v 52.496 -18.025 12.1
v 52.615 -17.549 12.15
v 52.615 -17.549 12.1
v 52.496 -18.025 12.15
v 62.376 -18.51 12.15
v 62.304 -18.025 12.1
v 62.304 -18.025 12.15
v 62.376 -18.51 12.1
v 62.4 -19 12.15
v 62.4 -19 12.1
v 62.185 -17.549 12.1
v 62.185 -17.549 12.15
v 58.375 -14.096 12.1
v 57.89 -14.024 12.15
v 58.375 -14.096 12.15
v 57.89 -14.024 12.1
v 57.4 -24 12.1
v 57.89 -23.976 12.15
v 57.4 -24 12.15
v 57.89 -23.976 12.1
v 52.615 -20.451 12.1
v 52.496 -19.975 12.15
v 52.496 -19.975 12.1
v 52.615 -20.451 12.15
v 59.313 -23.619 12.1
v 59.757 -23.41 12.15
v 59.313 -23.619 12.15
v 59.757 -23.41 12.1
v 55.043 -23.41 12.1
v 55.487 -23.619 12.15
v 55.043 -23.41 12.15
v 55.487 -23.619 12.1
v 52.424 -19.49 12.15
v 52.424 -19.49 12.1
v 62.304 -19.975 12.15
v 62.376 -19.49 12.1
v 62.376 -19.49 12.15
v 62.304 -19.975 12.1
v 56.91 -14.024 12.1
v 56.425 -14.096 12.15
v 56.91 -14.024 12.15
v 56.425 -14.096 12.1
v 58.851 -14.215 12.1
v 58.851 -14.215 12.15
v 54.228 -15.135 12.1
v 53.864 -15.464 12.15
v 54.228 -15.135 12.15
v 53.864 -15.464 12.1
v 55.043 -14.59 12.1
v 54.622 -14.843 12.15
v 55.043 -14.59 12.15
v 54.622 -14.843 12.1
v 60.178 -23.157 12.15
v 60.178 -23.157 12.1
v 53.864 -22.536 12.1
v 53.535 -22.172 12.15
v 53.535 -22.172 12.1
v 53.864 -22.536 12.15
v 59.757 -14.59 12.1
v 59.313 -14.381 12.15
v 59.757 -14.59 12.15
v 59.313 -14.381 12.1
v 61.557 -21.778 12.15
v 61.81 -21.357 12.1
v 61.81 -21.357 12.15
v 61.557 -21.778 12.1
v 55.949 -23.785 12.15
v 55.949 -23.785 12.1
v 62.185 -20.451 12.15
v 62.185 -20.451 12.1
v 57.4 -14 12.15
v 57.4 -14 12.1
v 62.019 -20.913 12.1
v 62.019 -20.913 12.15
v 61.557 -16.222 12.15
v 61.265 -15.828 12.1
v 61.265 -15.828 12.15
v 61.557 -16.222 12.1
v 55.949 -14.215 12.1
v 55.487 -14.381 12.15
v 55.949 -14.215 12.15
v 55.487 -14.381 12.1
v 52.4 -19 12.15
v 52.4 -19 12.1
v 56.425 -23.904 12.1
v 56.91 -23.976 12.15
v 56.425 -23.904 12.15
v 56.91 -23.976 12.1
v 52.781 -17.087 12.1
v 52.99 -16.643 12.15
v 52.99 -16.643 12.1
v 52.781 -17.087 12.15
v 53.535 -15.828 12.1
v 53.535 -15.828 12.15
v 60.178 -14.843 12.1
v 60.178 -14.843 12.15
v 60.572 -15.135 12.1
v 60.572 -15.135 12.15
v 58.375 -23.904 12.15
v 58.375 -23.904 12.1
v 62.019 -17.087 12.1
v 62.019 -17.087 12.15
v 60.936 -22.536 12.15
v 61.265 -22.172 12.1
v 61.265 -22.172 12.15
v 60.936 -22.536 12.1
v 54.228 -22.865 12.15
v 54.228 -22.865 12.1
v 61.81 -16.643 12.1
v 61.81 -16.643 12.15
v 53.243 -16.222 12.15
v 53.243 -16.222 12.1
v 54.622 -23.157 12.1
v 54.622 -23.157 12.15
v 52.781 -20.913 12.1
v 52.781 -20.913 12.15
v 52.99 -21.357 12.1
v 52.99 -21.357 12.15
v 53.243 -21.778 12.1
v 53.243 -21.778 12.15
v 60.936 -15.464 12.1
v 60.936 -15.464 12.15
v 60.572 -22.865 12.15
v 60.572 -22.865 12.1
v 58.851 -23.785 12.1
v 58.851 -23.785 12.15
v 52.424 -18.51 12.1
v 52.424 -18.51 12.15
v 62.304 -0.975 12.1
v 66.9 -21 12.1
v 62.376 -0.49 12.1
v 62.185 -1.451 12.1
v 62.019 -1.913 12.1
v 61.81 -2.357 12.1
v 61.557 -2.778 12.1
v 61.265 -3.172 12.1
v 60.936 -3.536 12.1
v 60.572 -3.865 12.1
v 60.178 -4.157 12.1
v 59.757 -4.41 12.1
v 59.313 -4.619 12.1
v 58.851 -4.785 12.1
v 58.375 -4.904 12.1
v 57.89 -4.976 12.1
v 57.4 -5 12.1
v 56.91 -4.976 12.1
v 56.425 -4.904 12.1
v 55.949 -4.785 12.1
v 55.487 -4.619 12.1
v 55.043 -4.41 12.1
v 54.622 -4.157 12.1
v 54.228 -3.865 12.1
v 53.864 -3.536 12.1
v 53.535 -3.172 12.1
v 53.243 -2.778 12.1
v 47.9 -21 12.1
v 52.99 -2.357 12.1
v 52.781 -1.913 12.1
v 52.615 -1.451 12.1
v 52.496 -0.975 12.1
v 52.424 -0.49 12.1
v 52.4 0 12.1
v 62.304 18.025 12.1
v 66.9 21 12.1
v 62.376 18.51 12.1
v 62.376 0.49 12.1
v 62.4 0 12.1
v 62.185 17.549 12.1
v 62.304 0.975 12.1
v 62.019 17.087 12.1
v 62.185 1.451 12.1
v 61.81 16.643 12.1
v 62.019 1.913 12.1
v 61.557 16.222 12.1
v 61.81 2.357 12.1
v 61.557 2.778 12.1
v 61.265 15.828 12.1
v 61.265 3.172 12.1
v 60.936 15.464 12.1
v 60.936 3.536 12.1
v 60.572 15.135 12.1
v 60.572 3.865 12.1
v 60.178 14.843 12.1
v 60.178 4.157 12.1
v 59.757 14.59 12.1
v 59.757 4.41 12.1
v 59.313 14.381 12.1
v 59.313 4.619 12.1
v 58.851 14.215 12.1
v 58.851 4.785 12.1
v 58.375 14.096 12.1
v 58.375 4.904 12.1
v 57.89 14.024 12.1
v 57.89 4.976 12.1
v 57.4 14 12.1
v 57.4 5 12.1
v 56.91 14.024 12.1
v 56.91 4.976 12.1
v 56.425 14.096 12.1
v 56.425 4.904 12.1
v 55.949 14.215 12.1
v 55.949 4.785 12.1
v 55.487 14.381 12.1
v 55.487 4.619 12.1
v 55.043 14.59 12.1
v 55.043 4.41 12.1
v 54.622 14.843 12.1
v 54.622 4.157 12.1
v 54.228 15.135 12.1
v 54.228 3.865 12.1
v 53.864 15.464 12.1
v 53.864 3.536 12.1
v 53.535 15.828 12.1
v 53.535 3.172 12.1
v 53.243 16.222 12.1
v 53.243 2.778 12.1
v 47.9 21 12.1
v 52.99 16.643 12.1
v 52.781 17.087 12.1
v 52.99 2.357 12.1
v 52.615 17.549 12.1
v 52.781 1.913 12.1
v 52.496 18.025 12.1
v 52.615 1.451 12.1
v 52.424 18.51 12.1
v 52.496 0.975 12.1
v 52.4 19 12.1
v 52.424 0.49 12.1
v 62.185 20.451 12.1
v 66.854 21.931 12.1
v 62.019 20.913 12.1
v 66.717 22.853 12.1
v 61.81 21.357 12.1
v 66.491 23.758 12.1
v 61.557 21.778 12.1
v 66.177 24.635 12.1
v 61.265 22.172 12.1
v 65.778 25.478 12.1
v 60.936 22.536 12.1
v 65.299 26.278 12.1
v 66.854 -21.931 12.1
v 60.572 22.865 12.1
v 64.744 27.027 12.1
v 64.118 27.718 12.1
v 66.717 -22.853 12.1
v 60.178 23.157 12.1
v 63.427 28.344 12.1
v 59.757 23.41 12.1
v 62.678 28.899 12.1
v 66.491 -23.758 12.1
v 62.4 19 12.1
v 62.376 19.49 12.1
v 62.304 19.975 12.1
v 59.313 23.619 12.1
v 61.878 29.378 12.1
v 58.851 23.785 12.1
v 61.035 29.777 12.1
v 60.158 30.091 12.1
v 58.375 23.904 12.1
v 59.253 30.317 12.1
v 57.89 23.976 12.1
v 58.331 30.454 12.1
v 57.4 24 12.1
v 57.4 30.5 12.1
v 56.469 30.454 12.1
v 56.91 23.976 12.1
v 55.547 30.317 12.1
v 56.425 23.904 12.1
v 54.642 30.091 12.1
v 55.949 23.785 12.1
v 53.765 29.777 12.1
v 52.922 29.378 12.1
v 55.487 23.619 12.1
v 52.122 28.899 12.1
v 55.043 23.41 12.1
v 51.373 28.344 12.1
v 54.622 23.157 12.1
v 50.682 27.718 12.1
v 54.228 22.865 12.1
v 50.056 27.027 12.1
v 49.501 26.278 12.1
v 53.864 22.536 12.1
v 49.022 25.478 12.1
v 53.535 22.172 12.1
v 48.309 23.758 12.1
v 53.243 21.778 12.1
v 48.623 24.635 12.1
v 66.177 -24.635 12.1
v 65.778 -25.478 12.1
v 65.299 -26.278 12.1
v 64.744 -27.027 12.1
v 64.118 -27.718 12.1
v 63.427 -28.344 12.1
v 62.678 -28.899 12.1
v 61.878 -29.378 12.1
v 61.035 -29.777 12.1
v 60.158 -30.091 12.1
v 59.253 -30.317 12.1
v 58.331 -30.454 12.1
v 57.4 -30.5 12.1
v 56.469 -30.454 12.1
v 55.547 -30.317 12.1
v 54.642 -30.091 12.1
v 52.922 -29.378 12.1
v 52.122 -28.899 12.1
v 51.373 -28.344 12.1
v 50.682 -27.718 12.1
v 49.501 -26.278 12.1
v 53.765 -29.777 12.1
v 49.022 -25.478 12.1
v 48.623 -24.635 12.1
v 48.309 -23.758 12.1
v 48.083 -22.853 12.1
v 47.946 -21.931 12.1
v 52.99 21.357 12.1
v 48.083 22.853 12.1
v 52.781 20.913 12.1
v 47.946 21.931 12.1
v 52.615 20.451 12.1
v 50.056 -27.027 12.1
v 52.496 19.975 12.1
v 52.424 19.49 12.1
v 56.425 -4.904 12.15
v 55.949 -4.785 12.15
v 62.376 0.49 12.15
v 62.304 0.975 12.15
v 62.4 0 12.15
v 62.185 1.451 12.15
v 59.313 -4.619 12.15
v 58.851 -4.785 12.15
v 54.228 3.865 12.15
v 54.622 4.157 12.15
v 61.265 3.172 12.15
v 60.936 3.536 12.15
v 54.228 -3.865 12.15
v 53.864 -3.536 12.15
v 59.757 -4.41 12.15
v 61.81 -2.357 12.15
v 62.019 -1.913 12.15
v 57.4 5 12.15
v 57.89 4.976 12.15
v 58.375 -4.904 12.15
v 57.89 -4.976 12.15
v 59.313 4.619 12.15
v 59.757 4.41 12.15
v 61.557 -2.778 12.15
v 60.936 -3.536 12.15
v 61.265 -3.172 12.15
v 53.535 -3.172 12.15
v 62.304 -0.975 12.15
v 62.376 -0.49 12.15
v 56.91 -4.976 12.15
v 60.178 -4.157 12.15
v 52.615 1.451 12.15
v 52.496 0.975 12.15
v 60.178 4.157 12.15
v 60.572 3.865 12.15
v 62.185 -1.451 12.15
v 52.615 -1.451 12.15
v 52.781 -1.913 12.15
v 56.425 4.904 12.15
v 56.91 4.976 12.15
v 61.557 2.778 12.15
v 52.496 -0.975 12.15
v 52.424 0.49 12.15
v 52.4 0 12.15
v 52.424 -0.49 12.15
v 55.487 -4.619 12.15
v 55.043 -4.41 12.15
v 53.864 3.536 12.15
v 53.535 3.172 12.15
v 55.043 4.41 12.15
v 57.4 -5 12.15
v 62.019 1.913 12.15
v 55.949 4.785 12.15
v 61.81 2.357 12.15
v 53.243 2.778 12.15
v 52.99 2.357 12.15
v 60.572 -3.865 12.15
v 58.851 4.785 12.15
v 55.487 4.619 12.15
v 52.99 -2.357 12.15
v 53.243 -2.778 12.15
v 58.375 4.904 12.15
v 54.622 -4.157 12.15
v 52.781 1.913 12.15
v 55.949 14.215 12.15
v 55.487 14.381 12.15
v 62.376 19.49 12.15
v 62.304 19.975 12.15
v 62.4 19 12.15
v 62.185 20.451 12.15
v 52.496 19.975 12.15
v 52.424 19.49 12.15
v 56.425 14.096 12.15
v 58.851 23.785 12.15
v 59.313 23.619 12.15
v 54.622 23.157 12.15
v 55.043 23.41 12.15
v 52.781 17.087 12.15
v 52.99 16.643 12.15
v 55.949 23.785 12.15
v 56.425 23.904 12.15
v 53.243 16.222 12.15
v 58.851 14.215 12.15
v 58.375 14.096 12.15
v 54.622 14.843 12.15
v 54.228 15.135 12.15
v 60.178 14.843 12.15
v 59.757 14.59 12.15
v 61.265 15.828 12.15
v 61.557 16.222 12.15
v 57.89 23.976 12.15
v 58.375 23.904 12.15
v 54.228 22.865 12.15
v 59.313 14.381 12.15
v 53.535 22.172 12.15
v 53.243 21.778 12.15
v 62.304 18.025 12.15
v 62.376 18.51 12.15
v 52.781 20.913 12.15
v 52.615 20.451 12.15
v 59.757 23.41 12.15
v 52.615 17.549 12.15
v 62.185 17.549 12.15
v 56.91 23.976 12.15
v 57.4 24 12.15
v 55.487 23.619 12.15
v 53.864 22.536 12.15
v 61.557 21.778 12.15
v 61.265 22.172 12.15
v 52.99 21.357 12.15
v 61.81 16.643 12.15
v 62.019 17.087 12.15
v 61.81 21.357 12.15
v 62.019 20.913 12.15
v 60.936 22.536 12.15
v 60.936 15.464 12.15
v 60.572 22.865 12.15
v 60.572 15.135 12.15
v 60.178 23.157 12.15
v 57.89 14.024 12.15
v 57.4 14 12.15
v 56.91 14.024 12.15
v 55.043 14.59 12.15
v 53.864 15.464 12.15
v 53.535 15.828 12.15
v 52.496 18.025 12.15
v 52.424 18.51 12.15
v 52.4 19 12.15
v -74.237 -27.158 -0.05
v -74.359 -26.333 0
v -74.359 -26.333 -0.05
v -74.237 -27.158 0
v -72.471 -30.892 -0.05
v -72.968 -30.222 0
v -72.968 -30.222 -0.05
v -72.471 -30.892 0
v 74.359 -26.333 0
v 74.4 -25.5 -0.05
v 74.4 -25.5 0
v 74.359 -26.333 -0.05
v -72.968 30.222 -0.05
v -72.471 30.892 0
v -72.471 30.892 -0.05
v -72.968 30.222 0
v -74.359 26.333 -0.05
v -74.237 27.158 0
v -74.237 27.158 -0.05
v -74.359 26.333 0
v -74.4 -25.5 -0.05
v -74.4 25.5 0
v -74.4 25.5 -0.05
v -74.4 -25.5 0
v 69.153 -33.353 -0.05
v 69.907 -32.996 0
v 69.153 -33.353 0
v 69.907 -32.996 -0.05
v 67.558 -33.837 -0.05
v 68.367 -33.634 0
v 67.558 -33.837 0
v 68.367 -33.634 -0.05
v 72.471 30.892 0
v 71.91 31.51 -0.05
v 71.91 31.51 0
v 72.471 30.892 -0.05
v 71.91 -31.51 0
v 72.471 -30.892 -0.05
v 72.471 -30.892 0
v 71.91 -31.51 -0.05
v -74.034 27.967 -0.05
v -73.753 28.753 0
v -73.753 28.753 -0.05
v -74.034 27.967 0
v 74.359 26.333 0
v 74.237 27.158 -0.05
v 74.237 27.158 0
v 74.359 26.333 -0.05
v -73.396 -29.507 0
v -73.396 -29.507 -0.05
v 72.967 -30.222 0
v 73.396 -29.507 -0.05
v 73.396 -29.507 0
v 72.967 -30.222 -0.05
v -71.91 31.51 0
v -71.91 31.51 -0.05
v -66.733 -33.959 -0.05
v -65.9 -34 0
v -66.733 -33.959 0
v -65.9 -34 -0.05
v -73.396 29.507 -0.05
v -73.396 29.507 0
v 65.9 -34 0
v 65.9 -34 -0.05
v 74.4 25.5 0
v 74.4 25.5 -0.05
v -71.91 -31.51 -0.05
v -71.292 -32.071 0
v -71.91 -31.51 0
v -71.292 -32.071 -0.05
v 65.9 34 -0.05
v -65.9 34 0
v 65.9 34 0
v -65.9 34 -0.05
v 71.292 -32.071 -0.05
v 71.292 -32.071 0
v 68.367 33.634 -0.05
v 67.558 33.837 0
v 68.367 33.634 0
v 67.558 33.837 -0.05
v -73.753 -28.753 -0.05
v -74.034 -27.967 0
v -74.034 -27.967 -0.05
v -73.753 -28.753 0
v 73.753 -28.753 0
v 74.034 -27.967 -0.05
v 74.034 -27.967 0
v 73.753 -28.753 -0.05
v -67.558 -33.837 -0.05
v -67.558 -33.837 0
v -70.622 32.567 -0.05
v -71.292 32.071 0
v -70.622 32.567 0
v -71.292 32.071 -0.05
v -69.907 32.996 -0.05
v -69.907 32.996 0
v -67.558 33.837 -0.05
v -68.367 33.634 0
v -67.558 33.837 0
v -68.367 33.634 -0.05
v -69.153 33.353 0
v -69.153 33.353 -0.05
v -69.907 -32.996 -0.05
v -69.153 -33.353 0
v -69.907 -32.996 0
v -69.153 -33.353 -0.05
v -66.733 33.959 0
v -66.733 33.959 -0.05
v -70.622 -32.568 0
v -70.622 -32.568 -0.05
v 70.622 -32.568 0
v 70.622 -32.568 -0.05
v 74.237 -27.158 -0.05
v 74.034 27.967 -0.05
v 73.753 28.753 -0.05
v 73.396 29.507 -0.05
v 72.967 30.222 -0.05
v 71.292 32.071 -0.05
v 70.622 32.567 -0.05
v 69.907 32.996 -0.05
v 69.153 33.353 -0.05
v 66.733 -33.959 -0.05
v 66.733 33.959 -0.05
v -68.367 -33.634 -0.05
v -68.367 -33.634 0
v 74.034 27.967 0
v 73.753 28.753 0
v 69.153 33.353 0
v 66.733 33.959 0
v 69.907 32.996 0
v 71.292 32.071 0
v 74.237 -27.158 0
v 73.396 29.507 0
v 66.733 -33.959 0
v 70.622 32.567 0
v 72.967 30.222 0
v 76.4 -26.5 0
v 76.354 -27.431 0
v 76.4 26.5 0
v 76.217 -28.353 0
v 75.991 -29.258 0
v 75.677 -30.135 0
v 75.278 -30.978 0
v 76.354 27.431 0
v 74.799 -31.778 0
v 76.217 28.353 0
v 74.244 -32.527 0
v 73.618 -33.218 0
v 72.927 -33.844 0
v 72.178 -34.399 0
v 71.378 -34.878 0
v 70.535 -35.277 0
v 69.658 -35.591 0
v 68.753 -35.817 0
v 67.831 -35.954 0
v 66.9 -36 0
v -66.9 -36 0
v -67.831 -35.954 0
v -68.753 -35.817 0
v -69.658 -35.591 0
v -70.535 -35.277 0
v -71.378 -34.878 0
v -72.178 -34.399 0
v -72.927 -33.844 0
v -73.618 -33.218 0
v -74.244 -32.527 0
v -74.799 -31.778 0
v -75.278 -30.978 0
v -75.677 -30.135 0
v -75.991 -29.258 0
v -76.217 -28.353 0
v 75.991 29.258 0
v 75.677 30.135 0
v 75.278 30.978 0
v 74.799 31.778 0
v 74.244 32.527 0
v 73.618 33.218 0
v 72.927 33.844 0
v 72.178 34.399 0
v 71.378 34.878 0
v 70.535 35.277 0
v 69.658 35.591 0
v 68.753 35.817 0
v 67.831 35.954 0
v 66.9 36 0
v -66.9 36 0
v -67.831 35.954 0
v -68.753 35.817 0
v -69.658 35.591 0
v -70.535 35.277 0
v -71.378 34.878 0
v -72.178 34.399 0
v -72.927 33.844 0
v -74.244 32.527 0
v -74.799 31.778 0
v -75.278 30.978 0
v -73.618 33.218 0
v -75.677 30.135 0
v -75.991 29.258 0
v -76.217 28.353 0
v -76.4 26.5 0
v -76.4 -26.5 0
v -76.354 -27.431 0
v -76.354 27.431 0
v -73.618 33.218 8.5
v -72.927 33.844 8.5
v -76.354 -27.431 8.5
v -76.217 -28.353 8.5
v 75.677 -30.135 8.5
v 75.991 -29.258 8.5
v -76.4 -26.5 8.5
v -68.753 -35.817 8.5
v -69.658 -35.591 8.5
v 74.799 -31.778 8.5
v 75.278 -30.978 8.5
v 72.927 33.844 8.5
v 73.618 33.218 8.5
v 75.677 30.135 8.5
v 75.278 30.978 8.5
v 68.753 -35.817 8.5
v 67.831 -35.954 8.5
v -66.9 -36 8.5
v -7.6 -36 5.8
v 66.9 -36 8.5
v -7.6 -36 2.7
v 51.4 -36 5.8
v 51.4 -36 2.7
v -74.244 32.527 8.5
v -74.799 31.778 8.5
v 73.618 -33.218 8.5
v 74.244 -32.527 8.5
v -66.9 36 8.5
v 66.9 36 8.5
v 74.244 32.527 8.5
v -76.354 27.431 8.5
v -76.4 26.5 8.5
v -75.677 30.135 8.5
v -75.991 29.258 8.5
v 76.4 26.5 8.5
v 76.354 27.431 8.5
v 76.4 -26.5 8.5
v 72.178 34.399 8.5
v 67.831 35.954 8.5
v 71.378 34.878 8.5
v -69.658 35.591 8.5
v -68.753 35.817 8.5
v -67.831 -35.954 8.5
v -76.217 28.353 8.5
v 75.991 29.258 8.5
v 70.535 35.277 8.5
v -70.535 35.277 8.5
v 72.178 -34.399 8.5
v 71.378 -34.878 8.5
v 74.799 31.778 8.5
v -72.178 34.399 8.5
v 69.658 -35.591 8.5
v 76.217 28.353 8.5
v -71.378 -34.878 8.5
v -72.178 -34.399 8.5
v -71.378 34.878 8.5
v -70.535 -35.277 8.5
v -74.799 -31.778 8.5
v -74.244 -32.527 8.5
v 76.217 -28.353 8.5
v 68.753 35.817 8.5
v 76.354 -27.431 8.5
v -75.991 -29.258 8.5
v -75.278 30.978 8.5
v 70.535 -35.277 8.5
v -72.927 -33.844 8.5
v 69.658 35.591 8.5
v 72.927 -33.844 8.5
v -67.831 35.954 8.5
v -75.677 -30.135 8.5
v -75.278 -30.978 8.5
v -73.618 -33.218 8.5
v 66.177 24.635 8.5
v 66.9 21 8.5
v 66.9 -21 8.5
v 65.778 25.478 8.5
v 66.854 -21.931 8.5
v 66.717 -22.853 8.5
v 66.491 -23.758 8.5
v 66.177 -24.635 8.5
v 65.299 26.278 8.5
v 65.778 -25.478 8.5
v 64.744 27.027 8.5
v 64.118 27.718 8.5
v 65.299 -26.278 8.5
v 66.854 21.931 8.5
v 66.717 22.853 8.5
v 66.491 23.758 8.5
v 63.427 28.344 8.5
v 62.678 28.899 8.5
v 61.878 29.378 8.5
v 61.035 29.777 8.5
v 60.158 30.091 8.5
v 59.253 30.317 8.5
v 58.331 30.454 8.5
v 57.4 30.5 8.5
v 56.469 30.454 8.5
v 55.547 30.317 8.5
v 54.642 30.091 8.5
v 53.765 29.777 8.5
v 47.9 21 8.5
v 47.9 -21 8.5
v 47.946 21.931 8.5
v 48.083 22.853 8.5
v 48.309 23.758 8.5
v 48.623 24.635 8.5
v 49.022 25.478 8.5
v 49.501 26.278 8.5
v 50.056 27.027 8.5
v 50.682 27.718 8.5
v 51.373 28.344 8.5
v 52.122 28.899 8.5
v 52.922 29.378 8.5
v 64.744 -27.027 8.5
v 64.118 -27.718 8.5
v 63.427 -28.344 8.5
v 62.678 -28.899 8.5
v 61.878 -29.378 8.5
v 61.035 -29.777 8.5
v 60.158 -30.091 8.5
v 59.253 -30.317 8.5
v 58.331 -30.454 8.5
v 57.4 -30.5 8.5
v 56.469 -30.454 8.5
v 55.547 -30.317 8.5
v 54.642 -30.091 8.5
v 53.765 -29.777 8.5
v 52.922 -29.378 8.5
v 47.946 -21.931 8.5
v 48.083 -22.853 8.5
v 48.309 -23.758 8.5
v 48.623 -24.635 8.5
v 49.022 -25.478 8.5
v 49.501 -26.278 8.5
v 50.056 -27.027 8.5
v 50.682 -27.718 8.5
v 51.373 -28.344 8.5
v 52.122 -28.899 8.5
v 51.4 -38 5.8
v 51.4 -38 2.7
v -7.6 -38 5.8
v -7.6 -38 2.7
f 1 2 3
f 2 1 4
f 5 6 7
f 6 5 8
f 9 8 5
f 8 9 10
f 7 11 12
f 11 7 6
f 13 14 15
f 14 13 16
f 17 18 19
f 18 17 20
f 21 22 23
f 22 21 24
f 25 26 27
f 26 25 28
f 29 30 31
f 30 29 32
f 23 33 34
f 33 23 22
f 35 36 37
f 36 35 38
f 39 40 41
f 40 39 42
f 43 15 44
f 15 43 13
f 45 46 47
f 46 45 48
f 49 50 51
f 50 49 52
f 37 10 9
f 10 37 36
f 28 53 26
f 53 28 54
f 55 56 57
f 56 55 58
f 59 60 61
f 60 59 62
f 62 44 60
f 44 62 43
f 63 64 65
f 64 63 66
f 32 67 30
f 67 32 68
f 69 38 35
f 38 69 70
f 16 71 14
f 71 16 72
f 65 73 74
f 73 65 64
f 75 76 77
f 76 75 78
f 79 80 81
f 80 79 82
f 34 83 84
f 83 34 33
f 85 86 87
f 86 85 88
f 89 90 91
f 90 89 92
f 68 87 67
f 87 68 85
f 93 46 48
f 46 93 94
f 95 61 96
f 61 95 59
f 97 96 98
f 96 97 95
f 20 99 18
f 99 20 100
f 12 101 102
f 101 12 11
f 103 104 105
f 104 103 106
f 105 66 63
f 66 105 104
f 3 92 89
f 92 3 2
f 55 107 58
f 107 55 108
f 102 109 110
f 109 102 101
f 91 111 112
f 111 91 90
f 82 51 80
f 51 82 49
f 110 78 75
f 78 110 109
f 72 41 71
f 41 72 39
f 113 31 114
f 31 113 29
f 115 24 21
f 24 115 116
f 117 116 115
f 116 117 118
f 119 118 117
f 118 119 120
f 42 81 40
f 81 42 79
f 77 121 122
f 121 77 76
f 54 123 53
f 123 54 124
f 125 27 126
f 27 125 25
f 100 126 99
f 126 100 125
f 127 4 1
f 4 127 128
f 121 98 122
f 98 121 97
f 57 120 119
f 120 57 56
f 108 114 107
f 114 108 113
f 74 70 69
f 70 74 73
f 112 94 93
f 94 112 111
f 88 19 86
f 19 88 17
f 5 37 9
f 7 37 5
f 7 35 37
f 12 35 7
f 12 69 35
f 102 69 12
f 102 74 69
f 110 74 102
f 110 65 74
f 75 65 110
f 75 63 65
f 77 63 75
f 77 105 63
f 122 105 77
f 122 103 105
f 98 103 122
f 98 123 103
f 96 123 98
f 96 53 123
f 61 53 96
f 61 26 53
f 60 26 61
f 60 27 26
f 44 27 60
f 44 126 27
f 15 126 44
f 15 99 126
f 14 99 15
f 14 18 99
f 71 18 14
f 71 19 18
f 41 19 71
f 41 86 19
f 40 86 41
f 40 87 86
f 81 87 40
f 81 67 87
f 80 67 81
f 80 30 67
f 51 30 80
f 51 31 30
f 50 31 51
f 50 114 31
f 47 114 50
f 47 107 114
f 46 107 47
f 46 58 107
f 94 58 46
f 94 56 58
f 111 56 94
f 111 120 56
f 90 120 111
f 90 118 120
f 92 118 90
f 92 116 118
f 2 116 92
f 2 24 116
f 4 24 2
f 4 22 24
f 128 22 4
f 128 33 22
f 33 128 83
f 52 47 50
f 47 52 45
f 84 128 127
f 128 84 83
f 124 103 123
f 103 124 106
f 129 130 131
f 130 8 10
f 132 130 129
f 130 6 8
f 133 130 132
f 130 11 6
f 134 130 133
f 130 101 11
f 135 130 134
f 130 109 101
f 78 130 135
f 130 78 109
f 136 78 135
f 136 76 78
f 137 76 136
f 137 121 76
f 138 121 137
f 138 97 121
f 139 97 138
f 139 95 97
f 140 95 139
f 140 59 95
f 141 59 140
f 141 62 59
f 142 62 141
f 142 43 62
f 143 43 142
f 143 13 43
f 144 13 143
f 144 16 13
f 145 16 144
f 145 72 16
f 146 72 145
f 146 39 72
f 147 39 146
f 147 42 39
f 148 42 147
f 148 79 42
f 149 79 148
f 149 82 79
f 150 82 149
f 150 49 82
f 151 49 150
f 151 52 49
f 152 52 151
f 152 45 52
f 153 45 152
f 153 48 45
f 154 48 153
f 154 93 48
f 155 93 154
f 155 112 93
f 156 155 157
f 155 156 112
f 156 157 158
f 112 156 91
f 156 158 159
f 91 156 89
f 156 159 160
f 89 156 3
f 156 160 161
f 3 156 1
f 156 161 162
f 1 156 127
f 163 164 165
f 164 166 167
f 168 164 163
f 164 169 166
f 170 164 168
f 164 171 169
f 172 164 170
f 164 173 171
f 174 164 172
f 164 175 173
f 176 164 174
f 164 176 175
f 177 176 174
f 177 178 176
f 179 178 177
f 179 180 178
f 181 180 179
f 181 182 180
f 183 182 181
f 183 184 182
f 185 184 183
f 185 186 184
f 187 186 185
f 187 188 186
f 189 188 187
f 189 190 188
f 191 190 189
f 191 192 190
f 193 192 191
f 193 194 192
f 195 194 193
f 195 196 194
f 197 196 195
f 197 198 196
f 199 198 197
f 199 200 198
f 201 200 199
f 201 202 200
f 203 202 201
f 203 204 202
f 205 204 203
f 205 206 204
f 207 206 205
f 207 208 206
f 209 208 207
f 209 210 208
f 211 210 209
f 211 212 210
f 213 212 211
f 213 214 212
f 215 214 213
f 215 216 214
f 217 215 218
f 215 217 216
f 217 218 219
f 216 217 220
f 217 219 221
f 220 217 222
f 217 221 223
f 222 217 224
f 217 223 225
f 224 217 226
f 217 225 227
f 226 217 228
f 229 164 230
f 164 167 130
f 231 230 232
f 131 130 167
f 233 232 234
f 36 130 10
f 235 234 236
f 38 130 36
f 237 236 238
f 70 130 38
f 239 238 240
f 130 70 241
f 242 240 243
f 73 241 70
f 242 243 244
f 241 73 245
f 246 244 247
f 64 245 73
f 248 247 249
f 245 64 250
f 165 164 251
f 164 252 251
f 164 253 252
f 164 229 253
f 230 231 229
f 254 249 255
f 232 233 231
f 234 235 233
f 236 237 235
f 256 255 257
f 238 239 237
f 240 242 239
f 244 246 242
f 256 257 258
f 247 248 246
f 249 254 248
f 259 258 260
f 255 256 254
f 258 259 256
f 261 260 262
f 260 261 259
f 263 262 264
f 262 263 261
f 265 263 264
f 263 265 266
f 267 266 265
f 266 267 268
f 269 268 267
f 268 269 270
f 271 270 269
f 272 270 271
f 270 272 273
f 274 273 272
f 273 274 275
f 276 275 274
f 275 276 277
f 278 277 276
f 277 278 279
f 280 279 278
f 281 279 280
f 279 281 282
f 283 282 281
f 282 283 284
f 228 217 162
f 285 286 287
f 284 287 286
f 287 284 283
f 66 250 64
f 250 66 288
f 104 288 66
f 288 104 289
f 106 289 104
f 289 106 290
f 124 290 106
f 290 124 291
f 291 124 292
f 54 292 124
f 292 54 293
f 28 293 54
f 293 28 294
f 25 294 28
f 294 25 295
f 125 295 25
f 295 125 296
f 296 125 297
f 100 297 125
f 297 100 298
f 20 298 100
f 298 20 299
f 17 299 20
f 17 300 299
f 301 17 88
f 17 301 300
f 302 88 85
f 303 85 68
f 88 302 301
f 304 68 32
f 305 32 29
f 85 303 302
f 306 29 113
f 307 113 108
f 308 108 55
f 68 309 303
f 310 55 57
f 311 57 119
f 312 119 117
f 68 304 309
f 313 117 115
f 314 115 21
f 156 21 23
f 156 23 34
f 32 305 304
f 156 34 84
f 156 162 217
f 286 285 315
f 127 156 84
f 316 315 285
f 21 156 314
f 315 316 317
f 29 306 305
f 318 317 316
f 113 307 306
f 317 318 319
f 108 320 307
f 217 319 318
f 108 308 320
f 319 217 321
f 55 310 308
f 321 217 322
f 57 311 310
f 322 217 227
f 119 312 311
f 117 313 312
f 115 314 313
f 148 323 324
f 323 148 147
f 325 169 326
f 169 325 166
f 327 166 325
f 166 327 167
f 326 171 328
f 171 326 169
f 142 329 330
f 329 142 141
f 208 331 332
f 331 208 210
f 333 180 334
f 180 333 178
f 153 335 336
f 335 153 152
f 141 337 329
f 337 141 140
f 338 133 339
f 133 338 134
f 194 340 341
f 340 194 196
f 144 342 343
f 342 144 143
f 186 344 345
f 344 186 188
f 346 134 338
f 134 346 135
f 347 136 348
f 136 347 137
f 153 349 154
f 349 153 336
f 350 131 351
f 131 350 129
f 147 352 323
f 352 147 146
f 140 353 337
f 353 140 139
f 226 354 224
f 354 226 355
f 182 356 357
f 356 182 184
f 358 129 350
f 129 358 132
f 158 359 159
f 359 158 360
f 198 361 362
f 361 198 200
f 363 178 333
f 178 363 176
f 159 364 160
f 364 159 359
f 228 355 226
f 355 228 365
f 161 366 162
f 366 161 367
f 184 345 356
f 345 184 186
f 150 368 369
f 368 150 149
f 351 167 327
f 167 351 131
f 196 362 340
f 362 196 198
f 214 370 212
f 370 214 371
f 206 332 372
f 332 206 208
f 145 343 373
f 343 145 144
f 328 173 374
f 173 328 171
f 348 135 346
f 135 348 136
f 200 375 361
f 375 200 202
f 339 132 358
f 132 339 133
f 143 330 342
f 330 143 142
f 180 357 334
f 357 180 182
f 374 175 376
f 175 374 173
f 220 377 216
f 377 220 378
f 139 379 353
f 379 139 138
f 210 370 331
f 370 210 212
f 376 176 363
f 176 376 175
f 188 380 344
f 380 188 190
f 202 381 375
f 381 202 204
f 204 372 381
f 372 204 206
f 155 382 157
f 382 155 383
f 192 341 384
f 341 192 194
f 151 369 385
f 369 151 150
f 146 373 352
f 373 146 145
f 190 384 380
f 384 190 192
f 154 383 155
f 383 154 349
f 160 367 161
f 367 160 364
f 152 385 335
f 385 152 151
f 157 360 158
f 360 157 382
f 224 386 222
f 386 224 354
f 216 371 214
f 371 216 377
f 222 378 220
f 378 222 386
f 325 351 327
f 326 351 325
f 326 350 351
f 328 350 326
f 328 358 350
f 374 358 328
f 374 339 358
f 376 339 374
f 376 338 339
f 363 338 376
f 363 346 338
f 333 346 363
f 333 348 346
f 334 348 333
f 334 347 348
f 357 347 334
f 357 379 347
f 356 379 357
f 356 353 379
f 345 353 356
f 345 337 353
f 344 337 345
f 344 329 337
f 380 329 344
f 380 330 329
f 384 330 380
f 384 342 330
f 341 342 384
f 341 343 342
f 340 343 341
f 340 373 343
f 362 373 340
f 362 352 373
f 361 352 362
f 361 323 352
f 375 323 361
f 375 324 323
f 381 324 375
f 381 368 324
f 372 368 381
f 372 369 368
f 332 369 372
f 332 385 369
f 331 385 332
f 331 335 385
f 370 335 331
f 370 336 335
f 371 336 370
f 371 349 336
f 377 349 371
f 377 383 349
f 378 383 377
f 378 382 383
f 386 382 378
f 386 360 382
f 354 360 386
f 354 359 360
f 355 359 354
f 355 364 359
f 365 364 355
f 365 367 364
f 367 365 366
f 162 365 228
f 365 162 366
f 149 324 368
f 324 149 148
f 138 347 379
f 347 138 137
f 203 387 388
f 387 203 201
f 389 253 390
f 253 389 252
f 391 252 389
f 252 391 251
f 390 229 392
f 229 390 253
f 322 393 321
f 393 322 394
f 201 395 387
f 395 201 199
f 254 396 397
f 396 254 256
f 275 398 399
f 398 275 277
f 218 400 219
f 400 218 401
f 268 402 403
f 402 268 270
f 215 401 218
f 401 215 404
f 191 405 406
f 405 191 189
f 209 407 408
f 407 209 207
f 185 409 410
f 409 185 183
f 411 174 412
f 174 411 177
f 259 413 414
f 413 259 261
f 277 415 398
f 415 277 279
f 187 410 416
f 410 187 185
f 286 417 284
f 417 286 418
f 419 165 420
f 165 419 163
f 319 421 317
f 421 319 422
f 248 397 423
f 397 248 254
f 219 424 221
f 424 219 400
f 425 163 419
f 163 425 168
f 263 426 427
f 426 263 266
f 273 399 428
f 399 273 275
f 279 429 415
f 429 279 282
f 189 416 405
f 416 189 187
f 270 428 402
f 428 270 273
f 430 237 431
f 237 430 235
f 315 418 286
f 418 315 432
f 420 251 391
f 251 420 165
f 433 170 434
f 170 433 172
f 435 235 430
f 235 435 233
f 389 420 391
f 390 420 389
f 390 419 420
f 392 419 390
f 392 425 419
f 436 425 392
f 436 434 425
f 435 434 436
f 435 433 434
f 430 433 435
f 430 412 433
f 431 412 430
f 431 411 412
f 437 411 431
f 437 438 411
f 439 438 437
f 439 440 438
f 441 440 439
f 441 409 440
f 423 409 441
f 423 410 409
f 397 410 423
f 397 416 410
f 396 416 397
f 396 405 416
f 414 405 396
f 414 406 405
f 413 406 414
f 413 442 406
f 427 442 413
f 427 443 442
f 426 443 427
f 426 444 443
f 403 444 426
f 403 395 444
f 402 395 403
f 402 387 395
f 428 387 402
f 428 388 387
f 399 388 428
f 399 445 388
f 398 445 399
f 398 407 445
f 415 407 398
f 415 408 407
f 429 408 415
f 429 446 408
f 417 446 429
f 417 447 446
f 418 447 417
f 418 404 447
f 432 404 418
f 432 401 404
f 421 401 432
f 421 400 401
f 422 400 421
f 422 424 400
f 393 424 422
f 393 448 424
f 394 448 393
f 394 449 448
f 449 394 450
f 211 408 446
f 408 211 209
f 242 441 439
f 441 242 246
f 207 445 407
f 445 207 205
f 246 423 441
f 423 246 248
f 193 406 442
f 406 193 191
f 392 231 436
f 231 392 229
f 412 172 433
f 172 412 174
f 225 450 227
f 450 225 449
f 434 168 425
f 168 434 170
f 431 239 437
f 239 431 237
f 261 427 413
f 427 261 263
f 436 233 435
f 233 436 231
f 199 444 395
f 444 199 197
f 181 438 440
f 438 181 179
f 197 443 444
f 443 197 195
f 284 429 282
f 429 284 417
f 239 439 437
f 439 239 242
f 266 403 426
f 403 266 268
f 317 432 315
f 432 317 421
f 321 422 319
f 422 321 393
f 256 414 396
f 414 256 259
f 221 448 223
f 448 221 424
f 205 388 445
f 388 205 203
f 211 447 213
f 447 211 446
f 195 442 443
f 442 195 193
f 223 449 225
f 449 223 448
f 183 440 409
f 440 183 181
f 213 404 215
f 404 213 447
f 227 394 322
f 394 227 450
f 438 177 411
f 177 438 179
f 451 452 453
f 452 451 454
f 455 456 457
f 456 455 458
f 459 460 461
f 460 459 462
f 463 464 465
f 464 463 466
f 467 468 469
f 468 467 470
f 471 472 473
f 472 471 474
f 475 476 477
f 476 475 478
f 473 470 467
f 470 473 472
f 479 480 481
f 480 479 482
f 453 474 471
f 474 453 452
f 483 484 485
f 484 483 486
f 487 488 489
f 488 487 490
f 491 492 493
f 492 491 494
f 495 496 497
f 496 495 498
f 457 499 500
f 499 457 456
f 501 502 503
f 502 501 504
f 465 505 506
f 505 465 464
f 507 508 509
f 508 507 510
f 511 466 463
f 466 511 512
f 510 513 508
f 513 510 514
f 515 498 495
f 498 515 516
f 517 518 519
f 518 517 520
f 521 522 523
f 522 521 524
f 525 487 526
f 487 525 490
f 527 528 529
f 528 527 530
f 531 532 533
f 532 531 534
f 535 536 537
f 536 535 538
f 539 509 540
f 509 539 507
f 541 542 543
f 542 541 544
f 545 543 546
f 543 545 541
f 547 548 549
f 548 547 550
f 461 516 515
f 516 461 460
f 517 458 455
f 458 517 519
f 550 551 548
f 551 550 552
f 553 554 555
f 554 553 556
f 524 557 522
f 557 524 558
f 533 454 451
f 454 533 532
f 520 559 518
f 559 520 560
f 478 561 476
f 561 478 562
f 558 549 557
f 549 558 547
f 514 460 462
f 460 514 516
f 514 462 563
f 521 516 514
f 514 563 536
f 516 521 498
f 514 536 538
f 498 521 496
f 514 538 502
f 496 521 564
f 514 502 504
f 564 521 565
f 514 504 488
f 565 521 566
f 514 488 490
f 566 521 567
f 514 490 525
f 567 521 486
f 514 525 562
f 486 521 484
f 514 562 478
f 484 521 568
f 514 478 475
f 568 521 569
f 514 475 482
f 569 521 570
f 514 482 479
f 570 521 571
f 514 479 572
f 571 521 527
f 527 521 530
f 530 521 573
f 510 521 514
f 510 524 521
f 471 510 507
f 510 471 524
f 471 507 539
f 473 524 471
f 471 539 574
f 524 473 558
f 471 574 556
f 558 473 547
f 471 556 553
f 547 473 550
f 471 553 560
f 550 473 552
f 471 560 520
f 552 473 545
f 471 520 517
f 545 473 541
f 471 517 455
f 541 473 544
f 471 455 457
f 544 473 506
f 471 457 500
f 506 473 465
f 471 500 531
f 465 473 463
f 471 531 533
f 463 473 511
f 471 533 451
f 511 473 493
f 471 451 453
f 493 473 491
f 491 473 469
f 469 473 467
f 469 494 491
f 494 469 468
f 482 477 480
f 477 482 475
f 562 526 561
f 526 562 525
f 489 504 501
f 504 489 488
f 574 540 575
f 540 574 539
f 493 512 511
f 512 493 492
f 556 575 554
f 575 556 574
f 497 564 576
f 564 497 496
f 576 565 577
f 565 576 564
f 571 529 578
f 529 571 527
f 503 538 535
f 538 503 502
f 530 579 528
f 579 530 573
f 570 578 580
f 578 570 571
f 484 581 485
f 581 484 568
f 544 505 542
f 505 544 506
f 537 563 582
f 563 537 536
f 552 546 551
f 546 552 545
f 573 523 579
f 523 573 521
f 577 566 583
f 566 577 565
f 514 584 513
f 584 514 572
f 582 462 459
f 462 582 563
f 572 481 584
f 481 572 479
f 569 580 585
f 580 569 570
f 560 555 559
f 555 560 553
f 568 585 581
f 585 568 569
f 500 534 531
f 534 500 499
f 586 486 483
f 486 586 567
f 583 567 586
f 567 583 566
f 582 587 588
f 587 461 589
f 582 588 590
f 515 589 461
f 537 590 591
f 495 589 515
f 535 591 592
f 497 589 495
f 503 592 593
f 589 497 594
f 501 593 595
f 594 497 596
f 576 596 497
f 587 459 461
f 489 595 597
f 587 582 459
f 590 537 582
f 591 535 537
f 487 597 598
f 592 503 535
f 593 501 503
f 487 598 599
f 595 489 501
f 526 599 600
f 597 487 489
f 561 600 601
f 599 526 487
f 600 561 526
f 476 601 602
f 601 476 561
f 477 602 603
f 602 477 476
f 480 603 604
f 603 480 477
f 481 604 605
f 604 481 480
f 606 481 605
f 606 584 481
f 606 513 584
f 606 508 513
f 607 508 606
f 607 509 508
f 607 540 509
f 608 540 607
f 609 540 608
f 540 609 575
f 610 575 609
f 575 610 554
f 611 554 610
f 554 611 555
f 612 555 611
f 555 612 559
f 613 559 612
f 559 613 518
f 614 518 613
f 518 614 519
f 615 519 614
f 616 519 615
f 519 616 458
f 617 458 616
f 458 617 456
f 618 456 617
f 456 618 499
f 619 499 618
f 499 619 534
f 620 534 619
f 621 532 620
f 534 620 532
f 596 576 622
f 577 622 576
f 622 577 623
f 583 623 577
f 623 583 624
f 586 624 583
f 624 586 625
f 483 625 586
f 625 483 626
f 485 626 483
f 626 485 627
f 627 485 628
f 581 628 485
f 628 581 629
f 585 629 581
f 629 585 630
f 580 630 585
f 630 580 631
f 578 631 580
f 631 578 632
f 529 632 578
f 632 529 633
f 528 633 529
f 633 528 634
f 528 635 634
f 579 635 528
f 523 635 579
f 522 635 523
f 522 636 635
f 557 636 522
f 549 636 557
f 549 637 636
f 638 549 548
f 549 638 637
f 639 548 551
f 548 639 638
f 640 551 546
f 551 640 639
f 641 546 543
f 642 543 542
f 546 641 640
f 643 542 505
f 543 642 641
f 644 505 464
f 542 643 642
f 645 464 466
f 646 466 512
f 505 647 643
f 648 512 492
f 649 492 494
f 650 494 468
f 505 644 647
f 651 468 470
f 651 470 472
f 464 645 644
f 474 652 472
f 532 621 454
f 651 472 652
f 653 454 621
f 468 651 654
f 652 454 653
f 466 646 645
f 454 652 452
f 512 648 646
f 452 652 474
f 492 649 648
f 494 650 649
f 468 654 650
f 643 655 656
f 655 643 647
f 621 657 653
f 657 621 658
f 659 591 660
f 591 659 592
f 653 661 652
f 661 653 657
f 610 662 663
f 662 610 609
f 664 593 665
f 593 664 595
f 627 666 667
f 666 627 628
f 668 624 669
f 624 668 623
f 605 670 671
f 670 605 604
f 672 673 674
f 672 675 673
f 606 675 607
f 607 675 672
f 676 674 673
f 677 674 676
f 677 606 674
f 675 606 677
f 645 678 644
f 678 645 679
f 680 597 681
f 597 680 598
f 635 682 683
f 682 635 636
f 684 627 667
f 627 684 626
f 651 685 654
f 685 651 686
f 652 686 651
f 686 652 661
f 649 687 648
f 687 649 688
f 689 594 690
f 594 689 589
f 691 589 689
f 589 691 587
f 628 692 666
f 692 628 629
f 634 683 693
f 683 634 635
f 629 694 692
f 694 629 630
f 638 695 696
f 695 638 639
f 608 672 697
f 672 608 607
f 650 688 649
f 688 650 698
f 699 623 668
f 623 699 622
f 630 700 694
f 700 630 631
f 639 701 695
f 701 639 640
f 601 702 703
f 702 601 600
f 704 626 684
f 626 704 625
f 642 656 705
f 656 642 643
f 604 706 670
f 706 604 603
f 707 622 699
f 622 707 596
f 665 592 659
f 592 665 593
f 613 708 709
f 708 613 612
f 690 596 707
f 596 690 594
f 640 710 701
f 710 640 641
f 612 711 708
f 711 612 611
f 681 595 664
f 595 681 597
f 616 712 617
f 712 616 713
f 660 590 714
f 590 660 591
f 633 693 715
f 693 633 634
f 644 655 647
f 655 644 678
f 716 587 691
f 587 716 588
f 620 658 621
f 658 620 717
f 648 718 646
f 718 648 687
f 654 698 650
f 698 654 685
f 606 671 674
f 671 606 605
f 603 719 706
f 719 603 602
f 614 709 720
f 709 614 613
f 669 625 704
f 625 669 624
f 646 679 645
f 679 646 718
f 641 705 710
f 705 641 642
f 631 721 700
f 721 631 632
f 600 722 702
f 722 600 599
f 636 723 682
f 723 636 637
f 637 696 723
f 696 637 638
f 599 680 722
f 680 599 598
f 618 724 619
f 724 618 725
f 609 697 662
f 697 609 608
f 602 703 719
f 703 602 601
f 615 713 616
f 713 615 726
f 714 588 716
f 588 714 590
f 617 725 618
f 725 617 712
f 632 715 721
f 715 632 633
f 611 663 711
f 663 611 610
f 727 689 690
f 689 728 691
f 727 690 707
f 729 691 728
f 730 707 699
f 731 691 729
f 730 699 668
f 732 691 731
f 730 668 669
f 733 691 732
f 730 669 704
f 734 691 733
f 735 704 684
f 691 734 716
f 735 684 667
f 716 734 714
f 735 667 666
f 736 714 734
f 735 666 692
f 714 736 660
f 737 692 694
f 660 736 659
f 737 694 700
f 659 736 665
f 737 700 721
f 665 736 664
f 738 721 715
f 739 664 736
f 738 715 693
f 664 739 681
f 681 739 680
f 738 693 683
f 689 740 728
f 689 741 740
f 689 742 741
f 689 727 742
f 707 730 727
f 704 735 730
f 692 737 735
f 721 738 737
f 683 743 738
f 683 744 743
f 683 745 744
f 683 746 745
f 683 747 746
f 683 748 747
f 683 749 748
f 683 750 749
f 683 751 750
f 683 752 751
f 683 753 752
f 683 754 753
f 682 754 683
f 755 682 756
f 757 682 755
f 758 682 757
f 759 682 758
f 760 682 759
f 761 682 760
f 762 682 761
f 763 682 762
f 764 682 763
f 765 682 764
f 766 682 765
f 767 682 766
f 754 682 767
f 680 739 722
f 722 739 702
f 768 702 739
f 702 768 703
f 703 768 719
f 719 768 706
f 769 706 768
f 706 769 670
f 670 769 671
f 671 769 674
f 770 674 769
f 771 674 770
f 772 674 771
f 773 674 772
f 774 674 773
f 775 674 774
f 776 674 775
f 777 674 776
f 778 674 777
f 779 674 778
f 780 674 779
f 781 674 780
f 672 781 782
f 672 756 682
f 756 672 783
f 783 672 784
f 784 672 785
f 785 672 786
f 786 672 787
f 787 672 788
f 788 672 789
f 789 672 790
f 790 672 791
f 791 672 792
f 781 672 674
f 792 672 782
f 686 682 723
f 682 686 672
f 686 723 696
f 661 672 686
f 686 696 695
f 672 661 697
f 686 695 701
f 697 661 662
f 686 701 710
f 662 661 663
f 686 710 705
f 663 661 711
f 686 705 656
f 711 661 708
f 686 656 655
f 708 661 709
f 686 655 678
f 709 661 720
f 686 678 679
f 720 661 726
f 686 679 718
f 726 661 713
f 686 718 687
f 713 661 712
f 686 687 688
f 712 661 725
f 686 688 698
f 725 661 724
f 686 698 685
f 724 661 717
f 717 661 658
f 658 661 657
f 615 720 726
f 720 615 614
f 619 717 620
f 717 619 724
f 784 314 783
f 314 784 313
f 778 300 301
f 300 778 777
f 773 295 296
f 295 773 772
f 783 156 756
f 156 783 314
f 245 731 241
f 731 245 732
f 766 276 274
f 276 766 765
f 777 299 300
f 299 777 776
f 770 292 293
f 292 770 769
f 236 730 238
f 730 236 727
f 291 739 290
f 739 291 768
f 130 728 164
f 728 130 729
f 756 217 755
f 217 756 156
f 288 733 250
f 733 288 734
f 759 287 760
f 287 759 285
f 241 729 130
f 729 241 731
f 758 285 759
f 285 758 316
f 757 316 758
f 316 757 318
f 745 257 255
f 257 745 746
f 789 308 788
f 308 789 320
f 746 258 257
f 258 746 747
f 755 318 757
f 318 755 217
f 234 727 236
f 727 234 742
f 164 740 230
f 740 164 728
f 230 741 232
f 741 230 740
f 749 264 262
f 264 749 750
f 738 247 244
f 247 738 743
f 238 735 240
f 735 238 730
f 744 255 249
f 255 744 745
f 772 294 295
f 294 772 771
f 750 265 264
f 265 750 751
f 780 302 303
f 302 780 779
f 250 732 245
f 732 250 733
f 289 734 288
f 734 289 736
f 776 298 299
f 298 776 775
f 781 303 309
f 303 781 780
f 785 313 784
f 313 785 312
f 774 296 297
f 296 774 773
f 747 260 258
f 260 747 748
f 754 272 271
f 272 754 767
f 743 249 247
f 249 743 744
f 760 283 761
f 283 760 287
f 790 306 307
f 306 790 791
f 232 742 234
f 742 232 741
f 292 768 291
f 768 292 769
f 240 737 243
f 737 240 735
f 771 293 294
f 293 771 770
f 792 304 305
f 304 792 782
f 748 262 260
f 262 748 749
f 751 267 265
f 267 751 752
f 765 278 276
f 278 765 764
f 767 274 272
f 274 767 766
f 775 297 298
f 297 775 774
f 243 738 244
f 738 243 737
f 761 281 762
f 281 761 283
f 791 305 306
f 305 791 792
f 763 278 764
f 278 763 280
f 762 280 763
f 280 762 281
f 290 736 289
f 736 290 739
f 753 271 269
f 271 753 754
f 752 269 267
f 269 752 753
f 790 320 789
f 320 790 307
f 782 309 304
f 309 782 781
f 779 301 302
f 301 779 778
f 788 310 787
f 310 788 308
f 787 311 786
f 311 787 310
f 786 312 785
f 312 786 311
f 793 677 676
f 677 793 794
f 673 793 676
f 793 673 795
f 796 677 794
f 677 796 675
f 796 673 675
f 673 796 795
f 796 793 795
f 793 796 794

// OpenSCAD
include <../common.scad>
// All measured/illustrative phone dimensions are named in common.scad.
// Phone screen at z=0, rear at z=phone_t. Bar toward +X (portrait top).
module pixel9pro(detail=true){
 color([0.025,0.03,0.035]) centered_box([phone_l,phone_w,phone_t],phone_r);
 color([0.18,0.20,0.22]) translate([phone_l/2-camera_bar_top-camera_bar_h/2,camera_bar_side_offset,phone_t]) centered_box([camera_bar_h,camera_bar_w,camera_bar_protrusion],camera_bar_h/2);
 if(detail){
  color([0.025,0.04,0.06]) for(y=phone_lens_y) translate([phone_l/2-camera_bar_top-camera_bar_h/2,y,phone_t+camera_bar_protrusion]) cylinder(d=phone_lens_d,h=phone_detail_t);
  color([0.05,0.14,0.18]) translate([0,0,-phone_detail_t]) centered_box([phone_l-2*phone_screen_inset,phone_w-2*phone_screen_inset,phone_detail_t],phone_r-phone_screen_radius_inset);
 }
 // Conservative button envelope on portrait right edge (-Y in this orientation).
 color([0.12,0.13,0.15]) translate([phone_l/2-phone_button_start-phone_button_length,-phone_w/2-phone_button_depth,phone_button_z]) cube([phone_button_length,phone_button_depth,phone_button_h]);
}
pixel9pro();
